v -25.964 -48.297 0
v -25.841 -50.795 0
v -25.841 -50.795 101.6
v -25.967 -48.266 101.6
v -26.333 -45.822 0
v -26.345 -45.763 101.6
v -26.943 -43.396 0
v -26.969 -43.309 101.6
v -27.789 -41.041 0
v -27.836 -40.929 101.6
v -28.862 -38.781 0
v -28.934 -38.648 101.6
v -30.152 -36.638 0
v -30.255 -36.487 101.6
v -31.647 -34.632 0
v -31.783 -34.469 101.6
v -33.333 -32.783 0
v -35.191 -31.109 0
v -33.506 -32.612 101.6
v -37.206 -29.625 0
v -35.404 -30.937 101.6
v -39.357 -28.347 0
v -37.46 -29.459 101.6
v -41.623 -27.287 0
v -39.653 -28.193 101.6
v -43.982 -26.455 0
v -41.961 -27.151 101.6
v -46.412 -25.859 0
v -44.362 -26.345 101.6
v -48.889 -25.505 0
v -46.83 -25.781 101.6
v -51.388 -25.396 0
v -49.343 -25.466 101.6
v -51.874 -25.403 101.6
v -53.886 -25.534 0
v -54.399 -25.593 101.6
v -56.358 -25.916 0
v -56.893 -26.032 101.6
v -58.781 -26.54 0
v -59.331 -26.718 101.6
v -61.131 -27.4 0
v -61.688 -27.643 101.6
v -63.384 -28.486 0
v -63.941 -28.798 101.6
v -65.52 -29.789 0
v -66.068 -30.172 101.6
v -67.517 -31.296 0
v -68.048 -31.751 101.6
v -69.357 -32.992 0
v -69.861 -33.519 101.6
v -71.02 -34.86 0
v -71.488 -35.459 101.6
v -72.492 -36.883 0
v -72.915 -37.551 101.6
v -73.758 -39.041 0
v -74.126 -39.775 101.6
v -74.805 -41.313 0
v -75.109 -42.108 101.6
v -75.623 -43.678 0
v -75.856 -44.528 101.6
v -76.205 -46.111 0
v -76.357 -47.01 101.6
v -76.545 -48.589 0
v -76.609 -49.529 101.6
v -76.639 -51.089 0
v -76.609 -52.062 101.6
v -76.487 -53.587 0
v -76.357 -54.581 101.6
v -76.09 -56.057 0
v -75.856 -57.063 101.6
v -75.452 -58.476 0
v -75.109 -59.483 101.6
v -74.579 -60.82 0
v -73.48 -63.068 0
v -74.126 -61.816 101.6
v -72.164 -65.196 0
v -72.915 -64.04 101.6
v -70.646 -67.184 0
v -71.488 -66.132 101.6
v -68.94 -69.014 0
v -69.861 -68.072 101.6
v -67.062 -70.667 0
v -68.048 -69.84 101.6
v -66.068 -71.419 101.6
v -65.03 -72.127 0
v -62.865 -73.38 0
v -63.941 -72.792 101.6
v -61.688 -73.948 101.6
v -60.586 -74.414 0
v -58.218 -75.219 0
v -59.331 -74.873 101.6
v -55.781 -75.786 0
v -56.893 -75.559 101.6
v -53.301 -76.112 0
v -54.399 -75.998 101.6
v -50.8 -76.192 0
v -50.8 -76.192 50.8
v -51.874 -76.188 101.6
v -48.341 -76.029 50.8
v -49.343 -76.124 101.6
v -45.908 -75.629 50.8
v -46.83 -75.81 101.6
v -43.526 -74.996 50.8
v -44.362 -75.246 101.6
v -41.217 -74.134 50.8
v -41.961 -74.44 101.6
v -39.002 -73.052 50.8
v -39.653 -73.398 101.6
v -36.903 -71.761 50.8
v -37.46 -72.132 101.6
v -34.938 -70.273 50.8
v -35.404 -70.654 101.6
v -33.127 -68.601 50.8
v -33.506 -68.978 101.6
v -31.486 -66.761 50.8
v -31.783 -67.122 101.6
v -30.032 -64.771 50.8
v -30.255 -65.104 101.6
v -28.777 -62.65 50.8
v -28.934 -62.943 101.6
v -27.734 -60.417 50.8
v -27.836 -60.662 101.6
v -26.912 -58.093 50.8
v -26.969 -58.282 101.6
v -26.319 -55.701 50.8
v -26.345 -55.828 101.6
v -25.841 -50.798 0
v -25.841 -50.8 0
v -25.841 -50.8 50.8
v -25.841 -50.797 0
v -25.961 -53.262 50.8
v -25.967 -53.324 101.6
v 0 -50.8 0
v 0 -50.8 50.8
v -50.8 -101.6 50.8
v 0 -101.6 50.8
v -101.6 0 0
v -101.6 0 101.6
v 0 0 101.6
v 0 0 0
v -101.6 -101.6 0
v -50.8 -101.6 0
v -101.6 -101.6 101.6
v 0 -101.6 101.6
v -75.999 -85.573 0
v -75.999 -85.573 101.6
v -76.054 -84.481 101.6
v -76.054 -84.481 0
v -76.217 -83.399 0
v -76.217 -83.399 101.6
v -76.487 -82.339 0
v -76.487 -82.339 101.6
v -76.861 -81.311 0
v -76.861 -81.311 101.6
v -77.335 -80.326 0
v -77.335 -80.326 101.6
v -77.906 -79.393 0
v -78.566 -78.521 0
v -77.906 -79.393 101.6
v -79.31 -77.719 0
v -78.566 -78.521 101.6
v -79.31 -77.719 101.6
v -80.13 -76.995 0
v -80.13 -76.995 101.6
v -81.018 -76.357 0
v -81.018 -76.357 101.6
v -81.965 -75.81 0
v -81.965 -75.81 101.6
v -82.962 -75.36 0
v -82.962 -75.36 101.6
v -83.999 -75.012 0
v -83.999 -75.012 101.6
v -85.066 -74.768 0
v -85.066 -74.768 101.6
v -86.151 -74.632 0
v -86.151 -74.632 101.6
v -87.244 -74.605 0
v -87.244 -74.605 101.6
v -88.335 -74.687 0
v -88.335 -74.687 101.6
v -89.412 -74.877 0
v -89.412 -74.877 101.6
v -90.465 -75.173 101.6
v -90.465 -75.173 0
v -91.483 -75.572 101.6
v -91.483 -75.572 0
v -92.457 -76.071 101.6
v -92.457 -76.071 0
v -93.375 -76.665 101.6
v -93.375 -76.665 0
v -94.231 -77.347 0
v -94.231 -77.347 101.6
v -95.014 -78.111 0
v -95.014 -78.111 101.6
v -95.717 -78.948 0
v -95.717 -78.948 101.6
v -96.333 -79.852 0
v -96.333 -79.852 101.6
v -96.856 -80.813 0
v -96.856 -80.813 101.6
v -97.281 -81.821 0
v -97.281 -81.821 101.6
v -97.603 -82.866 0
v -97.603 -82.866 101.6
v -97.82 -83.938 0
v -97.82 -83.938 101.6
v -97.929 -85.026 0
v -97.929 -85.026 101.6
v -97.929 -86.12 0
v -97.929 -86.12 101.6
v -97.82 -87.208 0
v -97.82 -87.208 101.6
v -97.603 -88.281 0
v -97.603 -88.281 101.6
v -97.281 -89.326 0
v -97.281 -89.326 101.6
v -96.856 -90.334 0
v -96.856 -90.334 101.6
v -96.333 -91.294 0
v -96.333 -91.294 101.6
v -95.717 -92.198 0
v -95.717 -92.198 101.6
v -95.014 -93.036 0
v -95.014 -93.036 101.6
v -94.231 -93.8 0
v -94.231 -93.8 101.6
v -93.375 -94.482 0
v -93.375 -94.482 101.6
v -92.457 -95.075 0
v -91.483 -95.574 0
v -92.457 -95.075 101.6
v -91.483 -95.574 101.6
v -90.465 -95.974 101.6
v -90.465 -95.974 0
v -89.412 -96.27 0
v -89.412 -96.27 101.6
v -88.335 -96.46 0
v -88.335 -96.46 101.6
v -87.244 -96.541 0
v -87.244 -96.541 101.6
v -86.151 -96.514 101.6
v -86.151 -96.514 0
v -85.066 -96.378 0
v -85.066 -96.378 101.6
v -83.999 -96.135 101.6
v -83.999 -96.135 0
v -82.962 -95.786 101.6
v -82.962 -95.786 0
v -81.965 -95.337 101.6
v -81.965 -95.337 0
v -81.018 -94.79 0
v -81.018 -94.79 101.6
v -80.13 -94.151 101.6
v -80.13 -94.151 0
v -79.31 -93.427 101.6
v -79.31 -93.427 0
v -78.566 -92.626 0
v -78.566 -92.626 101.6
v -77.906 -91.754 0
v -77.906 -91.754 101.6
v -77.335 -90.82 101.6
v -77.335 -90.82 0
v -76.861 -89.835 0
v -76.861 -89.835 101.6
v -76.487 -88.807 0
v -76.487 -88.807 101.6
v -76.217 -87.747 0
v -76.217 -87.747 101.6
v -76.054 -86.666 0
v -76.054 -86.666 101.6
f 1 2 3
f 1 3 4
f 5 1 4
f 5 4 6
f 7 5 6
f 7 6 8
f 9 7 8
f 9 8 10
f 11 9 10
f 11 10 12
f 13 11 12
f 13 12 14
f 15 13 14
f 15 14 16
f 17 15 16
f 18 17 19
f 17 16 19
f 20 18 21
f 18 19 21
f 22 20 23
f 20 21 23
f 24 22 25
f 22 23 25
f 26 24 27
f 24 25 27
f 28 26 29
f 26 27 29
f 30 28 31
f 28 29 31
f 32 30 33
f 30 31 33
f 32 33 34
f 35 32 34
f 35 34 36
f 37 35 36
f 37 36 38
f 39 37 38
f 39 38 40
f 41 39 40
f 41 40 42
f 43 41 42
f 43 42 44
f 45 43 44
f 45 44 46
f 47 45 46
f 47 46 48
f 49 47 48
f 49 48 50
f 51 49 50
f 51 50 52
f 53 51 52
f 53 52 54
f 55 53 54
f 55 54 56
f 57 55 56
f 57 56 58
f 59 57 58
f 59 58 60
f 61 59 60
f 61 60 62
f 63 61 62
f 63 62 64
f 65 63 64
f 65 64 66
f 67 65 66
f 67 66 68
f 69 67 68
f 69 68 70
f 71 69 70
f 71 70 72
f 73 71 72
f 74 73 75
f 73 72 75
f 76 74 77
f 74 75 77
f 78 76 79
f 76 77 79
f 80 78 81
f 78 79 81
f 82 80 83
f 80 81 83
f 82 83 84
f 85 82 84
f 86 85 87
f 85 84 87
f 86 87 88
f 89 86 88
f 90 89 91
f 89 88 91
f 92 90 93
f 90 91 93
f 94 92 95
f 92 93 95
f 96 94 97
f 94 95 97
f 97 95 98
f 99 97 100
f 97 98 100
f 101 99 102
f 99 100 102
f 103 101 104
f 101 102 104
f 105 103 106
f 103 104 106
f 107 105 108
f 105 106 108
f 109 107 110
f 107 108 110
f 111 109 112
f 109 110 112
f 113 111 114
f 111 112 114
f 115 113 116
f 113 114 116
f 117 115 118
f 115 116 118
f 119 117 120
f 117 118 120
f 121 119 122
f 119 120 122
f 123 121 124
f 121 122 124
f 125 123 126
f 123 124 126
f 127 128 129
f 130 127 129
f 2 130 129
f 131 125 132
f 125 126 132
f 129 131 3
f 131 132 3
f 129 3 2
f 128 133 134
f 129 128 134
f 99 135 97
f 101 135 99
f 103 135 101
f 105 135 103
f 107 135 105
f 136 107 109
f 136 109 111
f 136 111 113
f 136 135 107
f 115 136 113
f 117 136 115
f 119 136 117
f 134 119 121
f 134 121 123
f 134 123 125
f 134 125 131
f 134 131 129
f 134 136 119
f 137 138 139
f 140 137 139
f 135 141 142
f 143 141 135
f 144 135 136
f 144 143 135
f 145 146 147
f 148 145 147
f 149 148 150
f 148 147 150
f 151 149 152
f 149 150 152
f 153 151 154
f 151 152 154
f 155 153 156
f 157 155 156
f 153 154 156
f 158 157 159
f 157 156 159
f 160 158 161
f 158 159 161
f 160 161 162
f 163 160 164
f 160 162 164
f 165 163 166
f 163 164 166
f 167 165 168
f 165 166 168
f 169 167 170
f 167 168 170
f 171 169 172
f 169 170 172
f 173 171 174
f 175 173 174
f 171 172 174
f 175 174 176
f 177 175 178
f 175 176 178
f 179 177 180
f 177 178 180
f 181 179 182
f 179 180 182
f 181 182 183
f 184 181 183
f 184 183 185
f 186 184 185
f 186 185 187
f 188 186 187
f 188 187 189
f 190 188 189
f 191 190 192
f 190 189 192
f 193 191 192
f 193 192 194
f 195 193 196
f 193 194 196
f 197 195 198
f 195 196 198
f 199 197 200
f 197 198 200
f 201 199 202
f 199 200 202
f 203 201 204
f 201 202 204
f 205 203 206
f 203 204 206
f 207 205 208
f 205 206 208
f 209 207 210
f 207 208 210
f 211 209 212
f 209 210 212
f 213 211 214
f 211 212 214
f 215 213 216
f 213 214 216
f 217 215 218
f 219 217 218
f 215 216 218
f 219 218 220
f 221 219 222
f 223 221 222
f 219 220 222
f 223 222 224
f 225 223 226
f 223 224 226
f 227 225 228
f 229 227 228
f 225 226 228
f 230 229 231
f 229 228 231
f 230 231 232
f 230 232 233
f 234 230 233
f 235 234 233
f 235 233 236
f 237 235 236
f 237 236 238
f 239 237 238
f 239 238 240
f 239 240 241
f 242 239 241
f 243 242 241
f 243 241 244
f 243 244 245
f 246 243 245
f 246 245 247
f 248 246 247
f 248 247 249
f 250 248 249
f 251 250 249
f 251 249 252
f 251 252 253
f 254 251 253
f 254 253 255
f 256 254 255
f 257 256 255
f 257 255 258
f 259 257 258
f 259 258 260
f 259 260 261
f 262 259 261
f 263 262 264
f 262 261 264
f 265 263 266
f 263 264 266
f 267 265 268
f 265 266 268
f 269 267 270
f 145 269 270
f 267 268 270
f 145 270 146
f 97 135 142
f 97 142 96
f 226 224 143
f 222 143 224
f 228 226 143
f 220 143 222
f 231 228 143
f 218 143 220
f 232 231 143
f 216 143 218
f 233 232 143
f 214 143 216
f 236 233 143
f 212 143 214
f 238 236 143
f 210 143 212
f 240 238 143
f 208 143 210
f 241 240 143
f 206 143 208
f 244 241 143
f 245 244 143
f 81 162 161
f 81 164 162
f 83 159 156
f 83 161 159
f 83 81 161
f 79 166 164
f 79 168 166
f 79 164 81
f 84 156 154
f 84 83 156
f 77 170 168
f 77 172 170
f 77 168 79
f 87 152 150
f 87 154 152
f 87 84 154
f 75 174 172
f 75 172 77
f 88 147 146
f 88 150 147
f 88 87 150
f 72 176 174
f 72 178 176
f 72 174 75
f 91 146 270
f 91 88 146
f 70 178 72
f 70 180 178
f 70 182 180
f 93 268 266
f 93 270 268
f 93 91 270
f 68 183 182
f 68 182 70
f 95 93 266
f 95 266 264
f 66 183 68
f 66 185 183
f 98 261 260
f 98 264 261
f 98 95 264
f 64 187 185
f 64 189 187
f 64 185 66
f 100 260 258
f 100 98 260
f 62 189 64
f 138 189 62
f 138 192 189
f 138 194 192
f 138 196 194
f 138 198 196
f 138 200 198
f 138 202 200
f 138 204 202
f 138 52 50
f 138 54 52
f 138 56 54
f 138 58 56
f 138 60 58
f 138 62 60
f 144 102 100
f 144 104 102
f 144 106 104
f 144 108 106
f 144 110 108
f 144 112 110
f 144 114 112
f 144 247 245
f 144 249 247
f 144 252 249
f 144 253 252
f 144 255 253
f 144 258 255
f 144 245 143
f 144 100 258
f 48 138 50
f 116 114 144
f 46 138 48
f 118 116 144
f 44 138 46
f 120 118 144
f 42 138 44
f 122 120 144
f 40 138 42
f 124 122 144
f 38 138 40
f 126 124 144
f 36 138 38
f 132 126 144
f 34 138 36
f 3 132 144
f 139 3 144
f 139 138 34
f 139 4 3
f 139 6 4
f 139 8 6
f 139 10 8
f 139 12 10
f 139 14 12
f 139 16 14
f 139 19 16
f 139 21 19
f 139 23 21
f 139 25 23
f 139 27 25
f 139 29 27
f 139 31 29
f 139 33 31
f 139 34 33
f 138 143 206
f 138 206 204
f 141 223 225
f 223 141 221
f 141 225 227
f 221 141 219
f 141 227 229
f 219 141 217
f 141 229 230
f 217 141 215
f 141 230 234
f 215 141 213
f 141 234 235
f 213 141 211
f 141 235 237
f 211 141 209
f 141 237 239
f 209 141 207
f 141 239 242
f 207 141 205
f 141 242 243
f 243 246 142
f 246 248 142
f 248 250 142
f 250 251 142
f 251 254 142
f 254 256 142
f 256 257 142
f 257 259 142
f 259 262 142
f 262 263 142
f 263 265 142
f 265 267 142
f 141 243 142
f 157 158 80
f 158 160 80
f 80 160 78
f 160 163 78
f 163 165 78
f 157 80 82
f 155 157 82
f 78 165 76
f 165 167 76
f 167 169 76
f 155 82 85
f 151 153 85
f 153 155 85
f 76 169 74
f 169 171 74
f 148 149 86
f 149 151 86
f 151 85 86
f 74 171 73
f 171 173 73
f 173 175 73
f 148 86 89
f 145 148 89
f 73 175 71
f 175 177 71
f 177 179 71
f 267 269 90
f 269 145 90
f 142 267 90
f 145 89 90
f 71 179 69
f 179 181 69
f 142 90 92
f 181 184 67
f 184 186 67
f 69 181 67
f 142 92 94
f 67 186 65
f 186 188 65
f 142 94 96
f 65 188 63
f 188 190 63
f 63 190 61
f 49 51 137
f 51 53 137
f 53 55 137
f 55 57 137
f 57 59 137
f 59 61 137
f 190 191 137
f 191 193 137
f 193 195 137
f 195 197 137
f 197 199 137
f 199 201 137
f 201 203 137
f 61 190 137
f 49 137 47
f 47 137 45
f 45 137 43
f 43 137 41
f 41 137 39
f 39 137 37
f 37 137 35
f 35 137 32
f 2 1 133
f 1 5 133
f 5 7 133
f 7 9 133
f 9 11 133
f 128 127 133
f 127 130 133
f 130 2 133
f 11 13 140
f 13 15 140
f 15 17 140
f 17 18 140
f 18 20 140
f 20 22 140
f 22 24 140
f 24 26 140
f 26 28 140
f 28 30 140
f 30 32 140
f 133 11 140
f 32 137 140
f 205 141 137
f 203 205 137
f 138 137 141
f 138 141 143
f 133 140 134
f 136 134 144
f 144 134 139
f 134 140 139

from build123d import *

# Parameters (mm, degrees)
F0_W     = 101.6
F0_H     = 101.6
F1_DEPTH = 101.6
F2_R     = 25.4
F3_DEPTH = 101.6
F4_W     = 50.8
F4_H     = 50.8
F5_DEPTH = 50.8
F6_R     = 10.971648
F7_DEPTH = 101.6


with BuildPart() as f1:
    # F0 (on Front) → F1 (new body)
    with BuildSketch(Plane.XZ):
        with Locations((-50.8, 50.8)):
            Rectangle(F0_W, F0_H)
    extrude(amount=F1_DEPTH)

    # F2 (on face) → F3 (cut)
    with BuildSketch(Plane.XY.offset(101.6)):
        with Locations((-51.241014, -50.795451)):
            Circle(F2_R)
    extrude(amount=-F3_DEPTH, mode=Mode.SUBTRACT)

    # F4 (on face) → F5 (cut)
    with BuildSketch(Plane.YZ):
        with Locations((-76.2, 25.4)):
            Rectangle(F4_W, F4_H)
    extrude(amount=-F5_DEPTH, mode=Mode.SUBTRACT)

    # F6 (on face) → F7 (cut)
    with BuildSketch(Plane.XY.offset(101.6)):
        with Locations((-86.970754, -85.573204)):
            Circle(F6_R)
    extrude(amount=-F7_DEPTH, mode=Mode.SUBTRACT)


solid = f1.part
